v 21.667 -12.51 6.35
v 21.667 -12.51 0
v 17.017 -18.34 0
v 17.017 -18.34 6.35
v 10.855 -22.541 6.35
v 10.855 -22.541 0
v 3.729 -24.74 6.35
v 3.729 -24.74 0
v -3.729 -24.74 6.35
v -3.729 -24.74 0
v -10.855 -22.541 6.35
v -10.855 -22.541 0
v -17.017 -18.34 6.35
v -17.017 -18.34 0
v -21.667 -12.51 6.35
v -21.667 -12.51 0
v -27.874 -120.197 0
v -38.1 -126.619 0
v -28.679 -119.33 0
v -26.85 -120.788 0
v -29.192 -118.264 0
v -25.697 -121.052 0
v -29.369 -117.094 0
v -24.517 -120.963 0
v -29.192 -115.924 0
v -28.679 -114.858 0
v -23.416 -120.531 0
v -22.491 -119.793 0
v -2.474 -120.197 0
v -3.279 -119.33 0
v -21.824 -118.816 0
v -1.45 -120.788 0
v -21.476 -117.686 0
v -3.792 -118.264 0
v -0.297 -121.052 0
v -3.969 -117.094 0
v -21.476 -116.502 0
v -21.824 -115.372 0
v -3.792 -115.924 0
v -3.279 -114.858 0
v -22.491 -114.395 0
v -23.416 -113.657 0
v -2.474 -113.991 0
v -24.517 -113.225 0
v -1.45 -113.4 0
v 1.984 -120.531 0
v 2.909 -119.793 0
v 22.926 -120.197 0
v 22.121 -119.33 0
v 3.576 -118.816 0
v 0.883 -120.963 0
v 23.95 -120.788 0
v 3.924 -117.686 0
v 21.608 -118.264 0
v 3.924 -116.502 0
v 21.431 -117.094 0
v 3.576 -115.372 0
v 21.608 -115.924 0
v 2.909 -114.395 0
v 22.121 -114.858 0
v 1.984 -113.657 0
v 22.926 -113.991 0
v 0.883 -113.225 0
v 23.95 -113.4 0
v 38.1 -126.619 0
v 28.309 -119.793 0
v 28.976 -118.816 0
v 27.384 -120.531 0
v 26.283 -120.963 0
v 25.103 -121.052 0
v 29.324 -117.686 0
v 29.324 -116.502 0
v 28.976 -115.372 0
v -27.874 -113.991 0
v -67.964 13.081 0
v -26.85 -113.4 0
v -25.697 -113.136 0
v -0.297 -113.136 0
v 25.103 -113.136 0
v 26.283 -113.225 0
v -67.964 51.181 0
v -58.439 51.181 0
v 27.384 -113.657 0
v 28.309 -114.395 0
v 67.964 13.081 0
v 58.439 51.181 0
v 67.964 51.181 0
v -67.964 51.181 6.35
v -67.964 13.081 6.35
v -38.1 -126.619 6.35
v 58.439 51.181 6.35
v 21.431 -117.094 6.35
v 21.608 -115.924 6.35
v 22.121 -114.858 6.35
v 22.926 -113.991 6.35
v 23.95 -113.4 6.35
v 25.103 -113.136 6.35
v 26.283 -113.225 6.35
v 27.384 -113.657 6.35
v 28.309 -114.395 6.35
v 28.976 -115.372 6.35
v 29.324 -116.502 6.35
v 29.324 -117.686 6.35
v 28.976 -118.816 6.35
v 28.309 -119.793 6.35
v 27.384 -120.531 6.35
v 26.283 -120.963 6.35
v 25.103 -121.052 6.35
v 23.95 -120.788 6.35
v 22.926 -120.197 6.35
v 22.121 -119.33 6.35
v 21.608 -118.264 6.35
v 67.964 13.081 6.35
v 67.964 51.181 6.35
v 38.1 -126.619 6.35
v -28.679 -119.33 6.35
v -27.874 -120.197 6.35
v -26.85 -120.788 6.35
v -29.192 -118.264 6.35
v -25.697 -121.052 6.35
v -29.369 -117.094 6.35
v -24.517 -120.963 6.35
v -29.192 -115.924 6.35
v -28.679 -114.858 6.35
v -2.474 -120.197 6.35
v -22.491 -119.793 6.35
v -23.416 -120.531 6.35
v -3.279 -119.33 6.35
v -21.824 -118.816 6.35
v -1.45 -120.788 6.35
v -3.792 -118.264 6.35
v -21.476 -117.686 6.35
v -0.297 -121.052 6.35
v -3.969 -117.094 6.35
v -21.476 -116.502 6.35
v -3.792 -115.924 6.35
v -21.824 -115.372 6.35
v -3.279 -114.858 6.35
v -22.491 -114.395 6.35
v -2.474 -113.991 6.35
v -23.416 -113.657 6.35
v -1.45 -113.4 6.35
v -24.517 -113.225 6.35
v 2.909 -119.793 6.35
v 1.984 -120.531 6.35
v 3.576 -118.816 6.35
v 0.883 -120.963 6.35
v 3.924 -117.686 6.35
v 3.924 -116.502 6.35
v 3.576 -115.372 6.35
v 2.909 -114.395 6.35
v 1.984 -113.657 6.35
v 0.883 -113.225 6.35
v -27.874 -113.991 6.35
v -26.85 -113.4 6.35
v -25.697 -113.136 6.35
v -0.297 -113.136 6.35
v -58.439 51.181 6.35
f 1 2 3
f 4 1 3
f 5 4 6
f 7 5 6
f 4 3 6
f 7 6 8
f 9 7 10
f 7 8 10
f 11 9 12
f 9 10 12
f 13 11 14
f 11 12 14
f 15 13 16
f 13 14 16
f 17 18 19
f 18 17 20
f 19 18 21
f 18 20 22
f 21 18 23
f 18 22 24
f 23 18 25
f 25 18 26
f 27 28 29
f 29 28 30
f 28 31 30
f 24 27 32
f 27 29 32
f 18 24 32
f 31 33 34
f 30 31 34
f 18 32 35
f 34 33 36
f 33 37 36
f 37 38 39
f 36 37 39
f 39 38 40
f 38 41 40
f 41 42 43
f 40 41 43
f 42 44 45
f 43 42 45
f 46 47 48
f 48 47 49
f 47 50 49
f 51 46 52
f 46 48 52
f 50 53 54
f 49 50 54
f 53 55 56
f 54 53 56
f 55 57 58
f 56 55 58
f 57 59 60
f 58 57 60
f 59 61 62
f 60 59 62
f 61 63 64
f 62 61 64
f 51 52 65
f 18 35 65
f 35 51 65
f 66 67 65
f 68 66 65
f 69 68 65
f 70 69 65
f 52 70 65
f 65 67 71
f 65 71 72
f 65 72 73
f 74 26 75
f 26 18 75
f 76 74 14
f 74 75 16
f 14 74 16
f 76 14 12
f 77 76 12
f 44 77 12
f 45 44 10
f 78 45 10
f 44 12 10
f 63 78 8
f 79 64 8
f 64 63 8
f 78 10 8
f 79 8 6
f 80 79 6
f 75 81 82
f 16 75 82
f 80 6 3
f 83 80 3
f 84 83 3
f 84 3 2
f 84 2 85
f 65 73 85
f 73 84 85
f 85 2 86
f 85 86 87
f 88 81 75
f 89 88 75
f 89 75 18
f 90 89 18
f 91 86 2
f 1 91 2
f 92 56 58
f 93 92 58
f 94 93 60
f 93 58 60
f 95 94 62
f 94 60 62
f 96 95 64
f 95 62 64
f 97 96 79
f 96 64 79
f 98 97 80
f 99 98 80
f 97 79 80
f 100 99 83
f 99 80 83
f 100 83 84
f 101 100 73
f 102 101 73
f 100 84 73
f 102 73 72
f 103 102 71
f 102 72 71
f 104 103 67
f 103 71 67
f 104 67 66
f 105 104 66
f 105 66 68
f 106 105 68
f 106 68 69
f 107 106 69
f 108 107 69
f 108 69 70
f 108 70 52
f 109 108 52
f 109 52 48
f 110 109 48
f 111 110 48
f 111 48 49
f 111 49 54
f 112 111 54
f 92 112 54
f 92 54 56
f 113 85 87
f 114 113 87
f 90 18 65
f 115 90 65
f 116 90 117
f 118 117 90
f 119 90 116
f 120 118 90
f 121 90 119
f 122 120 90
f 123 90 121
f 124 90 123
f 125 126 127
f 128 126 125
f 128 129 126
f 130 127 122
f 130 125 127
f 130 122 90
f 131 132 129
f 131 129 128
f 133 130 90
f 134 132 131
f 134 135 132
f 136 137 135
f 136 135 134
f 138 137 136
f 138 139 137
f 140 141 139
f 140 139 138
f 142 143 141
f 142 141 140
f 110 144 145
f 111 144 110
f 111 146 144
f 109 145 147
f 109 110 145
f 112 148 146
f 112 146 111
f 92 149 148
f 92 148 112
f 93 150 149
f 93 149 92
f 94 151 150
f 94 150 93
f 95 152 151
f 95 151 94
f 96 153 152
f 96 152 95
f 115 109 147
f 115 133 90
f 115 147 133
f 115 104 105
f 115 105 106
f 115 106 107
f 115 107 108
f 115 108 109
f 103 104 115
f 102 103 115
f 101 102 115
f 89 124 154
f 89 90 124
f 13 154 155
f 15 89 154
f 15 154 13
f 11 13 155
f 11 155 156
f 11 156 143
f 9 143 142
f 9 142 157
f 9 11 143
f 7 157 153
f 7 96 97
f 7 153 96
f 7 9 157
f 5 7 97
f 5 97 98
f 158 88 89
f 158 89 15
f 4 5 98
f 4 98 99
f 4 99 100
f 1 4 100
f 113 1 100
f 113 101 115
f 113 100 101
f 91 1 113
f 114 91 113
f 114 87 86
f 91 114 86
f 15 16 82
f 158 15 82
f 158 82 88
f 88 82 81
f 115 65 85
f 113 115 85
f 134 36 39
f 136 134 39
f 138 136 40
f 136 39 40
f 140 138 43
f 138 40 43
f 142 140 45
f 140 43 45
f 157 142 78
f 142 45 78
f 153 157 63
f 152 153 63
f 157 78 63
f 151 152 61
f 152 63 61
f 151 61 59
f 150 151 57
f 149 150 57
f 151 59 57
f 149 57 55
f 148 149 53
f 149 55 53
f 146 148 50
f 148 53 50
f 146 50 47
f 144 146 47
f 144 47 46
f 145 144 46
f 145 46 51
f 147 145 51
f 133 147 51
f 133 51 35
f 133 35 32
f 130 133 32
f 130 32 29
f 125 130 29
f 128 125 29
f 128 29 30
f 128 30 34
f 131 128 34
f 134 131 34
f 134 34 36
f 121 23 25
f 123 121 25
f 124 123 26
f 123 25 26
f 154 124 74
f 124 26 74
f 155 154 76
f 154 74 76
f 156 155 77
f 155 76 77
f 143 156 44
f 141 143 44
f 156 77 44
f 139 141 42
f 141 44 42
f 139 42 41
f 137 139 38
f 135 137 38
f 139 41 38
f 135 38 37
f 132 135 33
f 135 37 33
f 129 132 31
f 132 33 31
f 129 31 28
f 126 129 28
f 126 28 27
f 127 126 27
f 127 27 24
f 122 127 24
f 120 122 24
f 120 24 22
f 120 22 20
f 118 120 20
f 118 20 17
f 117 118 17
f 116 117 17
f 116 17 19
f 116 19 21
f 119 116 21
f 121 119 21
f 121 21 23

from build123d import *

# Parameters (mm, degrees)
BOSS_EXTRUDE1_DEPTH            = 6.35
F_5_16_0_3125_DIAMETER_HOLE1_D = 7.9375


with BuildPart() as part:
    # Sketch1 → Boss-Extrude1 (new body)
    with BuildSketch(Plane.XY):
        with BuildLine():
            Line((-21.667089577, -12.5095), (-58.438816897, 51.181))
            Line((-58.438816897, 51.181), (-67.963816897, 51.181))
            Line((-67.963816897, 51.181), (-67.963816897, 13.081))
            Line((-67.963816897, 13.081), (-38.1, -126.619))
            Line((-38.1, -126.619), (38.1, -126.619))
            Line((38.1, -126.619), (67.963816897, 13.081))
            Line((67.963816897, 13.081), (67.963816897, 51.181))
            Line((67.963816897, 51.181), (58.438816897, 51.181))
            Line((58.438816897, 51.181), (21.667089577, -12.5095))
            ThreePointArc((21.667089577, -12.5095), (0, -25.019), (-21.667089577, -12.5095))
        make_face()
    extrude(amount=BOSS_EXTRUDE1_DEPTH)

    # 5/16 (0.3125) Diameter Hole1 (through all)
    with Locations(Plane.XY.offset(6.35)):
        with Locations((-25.4, -117.094), (25.4, -117.094), (0, -117.094)):
            Hole(F_5_16_0_3125_DIAMETER_HOLE1_D / 2)


solid = part.part
